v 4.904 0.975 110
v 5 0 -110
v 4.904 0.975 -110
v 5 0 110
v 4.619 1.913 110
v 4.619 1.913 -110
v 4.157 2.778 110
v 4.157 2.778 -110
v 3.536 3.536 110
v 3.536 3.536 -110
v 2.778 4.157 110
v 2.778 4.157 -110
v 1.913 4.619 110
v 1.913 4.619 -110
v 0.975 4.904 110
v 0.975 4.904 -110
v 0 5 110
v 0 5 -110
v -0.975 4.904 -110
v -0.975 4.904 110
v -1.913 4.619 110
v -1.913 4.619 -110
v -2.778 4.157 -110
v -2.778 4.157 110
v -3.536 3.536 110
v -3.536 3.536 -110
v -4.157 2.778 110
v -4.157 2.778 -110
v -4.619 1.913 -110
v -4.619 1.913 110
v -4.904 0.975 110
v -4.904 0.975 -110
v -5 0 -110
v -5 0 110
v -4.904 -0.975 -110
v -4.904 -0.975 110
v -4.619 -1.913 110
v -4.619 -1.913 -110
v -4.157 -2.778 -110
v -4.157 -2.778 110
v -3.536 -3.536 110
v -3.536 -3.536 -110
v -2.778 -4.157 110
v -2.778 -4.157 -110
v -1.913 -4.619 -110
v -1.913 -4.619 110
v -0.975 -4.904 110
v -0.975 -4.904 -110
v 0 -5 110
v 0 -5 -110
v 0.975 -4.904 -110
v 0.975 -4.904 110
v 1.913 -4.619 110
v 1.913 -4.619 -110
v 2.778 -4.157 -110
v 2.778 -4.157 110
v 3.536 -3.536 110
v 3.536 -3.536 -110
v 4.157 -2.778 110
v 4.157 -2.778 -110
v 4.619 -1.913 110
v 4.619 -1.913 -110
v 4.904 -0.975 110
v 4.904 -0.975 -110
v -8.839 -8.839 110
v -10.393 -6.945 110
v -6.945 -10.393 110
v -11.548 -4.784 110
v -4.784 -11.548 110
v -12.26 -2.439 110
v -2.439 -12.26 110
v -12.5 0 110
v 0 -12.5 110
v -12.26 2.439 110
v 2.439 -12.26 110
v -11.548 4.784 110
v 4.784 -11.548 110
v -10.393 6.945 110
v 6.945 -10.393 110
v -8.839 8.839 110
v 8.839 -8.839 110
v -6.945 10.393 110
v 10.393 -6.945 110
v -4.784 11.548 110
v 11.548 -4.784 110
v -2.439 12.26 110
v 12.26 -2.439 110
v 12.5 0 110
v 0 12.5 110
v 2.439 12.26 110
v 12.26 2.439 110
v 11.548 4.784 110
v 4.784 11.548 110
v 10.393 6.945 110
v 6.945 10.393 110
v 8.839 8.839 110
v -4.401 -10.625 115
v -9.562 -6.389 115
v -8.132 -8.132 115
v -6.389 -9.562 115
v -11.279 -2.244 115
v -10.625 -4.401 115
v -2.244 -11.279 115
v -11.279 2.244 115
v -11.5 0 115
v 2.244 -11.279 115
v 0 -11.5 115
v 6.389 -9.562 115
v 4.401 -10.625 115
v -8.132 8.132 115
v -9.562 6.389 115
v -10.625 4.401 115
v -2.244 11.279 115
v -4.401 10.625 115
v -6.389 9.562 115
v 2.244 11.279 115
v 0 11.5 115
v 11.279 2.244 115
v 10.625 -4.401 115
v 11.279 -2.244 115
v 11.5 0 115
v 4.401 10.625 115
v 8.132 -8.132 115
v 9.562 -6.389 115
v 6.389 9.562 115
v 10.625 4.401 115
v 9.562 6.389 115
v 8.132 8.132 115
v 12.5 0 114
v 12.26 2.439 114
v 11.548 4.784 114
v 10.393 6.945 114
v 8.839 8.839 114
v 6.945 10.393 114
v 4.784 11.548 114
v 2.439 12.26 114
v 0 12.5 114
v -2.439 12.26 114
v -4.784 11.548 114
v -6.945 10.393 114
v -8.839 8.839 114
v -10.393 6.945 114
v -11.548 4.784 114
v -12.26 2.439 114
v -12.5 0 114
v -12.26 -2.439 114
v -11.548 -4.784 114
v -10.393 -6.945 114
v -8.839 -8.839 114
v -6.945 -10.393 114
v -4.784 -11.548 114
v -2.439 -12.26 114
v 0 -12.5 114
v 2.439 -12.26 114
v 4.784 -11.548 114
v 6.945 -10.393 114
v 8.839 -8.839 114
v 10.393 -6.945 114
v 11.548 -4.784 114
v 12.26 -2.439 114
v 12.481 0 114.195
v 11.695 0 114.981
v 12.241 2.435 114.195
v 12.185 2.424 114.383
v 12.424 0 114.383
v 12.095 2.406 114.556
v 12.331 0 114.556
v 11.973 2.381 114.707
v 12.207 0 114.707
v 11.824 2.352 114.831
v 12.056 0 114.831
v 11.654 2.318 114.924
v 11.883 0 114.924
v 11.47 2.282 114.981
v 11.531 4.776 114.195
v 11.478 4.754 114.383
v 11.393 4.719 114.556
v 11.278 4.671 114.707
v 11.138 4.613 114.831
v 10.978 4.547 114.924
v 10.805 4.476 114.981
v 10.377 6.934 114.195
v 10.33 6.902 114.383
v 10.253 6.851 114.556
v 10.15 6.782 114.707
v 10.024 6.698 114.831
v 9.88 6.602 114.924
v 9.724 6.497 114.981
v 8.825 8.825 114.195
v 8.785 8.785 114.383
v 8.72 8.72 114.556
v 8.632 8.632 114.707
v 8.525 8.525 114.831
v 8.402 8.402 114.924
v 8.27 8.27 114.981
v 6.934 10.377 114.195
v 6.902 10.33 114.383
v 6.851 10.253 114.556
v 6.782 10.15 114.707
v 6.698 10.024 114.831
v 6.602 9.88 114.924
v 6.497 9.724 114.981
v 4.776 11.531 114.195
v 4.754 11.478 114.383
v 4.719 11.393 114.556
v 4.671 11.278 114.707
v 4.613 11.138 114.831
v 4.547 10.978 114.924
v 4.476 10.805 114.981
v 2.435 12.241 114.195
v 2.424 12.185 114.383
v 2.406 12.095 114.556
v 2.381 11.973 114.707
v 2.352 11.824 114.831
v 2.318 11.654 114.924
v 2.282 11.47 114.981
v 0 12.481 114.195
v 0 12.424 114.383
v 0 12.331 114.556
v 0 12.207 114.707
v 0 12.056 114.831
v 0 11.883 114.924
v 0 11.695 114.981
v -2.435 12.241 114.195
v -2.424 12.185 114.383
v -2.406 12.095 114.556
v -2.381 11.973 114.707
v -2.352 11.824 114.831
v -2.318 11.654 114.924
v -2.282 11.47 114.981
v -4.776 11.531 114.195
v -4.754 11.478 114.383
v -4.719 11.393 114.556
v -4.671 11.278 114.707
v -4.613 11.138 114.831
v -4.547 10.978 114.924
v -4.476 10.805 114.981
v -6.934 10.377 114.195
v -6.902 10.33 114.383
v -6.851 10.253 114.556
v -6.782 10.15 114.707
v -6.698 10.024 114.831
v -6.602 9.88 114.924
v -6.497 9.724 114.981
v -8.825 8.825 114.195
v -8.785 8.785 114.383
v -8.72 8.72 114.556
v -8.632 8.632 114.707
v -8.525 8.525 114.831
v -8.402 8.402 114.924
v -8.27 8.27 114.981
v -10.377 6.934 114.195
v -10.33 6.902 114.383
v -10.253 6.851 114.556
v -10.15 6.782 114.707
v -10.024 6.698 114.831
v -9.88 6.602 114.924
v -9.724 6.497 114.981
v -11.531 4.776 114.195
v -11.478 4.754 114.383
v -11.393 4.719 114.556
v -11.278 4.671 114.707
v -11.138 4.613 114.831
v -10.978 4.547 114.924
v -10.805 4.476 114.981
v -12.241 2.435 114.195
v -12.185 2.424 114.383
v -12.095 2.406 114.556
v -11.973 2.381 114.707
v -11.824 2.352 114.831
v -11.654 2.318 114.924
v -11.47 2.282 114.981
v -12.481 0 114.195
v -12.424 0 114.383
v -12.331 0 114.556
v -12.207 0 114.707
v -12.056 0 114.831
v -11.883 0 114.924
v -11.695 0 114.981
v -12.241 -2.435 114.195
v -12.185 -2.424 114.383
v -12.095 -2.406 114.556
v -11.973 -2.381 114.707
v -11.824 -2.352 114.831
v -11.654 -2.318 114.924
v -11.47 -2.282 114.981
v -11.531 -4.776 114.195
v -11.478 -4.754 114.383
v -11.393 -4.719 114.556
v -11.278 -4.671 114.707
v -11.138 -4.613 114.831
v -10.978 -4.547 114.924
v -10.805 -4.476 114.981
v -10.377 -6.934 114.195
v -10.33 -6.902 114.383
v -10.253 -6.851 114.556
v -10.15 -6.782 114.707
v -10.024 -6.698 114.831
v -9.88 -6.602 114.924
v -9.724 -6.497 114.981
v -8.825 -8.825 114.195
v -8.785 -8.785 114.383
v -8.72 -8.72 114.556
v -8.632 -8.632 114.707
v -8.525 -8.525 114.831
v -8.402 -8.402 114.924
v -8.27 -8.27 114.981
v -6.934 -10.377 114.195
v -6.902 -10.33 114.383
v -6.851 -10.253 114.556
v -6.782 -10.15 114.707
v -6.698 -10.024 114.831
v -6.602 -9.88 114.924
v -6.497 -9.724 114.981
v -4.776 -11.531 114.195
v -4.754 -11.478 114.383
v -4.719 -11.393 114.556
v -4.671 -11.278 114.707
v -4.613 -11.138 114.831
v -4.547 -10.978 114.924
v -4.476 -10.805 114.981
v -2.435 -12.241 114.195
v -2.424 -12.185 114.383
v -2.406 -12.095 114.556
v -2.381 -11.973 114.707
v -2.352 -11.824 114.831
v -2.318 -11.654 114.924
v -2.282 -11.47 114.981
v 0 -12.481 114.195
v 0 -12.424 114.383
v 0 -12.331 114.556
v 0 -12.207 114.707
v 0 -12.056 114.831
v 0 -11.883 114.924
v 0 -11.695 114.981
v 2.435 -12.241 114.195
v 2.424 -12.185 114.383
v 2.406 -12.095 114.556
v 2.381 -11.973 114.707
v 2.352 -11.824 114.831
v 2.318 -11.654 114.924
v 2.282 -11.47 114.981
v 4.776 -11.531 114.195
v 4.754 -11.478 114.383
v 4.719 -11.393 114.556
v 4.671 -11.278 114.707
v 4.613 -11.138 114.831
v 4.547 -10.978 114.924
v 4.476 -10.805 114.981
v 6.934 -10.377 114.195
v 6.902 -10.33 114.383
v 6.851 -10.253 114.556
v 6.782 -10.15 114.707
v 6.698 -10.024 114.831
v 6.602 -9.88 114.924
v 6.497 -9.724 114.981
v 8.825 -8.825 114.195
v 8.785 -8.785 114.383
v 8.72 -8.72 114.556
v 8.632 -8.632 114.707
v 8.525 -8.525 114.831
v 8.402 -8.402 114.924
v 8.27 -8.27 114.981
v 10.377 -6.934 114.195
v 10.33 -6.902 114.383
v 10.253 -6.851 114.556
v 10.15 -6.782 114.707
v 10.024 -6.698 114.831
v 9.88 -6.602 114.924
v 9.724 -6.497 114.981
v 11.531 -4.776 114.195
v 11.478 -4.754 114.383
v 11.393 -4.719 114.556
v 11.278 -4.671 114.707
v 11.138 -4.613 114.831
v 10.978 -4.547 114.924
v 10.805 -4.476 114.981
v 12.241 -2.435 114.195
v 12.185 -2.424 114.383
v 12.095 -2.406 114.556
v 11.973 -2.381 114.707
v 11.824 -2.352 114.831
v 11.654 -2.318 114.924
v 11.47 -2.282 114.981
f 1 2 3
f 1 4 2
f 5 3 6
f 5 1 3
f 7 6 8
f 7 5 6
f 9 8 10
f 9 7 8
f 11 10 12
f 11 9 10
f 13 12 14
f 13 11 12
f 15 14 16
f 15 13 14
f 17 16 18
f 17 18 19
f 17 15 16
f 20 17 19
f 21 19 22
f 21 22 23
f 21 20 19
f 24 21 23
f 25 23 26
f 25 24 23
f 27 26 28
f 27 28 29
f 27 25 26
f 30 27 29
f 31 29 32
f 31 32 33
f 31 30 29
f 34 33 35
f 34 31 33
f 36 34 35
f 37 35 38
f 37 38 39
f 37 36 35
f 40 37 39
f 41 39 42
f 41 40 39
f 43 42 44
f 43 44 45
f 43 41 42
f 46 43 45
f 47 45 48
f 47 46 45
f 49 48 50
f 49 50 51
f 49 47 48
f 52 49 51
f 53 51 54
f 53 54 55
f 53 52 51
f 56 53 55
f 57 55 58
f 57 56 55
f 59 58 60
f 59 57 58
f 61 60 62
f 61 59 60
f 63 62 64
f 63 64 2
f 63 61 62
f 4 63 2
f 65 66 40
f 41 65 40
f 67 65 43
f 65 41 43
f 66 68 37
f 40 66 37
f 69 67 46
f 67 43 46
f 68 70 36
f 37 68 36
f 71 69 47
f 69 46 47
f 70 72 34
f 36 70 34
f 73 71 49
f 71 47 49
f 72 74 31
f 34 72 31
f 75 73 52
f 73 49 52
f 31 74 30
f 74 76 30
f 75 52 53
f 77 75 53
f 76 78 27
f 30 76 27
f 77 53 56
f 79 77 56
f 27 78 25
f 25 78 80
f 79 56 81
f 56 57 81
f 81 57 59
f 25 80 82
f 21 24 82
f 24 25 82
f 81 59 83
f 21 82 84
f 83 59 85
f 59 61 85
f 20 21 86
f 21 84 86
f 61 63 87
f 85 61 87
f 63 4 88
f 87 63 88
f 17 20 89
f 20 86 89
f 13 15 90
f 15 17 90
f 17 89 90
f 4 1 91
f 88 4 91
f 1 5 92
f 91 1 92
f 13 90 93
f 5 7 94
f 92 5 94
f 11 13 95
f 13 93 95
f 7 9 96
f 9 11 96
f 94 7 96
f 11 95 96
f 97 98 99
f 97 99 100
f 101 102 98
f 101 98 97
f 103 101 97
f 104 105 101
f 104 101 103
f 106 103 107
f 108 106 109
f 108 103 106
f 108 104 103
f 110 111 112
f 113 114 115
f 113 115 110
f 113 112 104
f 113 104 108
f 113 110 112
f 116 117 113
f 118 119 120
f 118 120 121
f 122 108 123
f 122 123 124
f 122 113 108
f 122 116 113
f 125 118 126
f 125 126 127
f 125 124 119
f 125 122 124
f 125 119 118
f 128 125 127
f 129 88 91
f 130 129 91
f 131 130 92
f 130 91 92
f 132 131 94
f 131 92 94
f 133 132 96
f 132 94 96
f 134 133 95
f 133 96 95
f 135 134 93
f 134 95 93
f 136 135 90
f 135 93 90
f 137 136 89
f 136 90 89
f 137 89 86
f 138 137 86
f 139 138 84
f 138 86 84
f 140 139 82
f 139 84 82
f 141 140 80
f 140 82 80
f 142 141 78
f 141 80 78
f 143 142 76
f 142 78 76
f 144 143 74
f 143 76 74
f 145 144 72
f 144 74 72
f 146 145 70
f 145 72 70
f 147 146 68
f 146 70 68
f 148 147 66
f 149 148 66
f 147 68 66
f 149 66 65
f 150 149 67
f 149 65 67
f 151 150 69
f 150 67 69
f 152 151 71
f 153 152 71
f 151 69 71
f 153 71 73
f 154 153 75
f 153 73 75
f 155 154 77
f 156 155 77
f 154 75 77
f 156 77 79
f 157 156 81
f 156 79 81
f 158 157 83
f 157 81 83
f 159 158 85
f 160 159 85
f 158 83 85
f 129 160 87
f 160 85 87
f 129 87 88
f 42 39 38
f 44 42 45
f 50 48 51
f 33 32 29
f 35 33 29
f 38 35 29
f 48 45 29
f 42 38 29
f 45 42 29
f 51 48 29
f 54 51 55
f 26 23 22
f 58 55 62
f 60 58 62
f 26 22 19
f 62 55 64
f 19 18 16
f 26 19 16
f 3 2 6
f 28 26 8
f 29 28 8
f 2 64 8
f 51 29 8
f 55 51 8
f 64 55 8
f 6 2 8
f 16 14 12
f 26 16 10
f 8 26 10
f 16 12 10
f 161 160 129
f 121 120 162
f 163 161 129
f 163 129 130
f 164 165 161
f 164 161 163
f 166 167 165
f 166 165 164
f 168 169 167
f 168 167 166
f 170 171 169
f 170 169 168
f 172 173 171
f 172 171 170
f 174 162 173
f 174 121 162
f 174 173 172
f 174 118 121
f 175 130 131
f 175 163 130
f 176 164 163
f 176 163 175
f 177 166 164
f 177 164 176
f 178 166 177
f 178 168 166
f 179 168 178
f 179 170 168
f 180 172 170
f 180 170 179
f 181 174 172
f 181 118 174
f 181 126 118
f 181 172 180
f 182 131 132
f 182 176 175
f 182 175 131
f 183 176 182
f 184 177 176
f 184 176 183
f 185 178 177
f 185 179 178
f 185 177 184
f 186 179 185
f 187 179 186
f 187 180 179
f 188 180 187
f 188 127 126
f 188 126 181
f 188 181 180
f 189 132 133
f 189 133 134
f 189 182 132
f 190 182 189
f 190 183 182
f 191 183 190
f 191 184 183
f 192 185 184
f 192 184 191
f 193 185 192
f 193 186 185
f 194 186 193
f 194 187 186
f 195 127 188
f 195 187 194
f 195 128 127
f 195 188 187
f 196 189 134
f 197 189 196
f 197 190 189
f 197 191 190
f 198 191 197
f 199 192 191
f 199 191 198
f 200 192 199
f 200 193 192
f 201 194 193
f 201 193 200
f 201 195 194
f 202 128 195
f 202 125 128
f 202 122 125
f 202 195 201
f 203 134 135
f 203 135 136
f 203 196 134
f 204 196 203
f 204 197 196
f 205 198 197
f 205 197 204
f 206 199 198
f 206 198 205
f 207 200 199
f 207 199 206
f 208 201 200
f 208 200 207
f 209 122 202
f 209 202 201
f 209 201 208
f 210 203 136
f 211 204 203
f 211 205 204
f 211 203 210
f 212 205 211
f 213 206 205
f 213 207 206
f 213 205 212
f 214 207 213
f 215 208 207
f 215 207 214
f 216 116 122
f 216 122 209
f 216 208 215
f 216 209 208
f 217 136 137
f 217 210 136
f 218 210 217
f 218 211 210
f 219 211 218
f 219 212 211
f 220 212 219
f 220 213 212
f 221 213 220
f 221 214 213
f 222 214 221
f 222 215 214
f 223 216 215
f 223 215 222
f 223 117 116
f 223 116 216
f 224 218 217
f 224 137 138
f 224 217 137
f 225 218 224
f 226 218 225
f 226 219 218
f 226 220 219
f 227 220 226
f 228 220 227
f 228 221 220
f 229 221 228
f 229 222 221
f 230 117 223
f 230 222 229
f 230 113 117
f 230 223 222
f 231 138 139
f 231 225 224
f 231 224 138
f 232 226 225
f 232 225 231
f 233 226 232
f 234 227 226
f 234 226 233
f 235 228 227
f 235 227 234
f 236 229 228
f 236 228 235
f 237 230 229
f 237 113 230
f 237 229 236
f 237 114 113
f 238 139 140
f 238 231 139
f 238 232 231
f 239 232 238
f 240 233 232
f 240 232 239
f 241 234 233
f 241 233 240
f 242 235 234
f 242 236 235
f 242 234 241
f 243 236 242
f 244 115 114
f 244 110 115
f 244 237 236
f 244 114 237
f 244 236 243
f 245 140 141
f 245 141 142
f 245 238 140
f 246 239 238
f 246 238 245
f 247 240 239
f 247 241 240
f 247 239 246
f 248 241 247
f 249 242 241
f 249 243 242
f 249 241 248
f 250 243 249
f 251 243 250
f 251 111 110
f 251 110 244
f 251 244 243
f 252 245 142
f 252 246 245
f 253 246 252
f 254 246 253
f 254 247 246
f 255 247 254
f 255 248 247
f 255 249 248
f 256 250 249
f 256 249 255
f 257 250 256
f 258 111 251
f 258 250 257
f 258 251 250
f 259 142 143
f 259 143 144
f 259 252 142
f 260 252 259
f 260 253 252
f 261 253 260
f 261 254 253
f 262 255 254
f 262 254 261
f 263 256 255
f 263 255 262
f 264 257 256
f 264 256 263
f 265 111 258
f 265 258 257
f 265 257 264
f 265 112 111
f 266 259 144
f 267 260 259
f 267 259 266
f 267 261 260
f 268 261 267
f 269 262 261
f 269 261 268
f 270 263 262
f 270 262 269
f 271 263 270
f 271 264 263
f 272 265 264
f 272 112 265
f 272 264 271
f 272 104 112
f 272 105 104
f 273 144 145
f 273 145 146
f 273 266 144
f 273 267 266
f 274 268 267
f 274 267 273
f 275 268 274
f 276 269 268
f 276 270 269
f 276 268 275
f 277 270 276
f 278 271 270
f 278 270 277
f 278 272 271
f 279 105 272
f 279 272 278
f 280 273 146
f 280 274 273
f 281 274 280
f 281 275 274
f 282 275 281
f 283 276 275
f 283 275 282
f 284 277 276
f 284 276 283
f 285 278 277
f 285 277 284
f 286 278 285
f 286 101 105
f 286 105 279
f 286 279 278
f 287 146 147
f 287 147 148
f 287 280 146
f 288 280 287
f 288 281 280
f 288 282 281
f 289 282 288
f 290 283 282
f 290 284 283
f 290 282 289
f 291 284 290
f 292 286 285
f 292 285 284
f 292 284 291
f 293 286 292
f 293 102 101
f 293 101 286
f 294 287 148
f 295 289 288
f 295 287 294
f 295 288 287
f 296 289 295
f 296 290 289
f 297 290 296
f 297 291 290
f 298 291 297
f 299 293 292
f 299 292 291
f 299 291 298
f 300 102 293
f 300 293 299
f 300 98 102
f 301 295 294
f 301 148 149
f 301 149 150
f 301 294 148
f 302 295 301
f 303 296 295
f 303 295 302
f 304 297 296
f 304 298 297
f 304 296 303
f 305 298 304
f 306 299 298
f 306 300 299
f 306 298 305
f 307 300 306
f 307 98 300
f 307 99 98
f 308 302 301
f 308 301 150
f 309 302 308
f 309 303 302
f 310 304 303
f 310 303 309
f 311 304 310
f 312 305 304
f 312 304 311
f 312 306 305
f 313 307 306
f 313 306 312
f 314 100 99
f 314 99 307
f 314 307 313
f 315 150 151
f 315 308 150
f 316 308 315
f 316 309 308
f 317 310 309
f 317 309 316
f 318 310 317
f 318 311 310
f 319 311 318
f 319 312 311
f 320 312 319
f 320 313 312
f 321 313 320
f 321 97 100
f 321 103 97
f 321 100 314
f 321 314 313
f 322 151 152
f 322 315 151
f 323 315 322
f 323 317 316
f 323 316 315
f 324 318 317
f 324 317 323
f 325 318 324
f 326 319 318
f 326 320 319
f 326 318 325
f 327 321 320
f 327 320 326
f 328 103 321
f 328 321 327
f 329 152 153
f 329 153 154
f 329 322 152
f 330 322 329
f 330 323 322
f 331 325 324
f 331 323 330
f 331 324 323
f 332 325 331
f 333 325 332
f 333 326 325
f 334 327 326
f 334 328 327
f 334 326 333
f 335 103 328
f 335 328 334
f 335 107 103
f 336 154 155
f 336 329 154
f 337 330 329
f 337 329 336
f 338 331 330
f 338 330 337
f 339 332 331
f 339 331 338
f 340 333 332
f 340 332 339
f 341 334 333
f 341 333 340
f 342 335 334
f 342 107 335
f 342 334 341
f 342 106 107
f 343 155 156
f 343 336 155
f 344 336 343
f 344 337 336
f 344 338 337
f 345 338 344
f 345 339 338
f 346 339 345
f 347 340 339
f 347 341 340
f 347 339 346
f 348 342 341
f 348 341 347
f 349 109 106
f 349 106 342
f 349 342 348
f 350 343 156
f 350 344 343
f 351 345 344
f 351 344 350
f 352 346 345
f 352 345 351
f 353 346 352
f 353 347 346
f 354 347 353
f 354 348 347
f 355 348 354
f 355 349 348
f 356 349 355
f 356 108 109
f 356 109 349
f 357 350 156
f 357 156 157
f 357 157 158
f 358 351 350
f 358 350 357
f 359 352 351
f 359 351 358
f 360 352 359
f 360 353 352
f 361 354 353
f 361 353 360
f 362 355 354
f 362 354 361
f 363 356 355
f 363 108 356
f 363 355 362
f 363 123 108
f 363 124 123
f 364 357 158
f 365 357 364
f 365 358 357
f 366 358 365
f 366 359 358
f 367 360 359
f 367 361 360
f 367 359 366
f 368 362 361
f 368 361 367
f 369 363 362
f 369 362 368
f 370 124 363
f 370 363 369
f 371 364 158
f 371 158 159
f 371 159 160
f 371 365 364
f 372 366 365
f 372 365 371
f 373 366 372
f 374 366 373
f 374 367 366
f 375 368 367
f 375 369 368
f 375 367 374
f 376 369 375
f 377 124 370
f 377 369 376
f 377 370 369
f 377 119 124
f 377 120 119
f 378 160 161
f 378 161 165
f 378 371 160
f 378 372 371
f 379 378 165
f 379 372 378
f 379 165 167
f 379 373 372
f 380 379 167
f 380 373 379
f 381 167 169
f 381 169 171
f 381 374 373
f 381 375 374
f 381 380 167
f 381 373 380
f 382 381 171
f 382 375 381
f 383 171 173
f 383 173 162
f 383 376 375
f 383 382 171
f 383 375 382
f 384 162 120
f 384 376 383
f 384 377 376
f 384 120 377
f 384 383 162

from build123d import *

# Parameters (mm, degrees)
SKETCH1_R           = 5
BOSS_EXTRUDE1_DEPTH = 110
SKETCH2_R           = 12.5
BOSS_EXTRUDE2_DEPTH = 5
FILLET1_R           = 1


with BuildPart() as part:
    # Sketch1 → Boss-Extrude1 (new, symmetric)
    with BuildSketch(Plane.XY):
        Circle(SKETCH1_R)
    extrude(amount=BOSS_EXTRUDE1_DEPTH, both=True)

    # Sketch2 → Boss-Extrude2 (add)
    with BuildSketch(Plane.XY.offset(110)):
        Circle(SKETCH2_R)
    extrude(amount=BOSS_EXTRUDE2_DEPTH)

    # Fillet1
    fillet1_edges = [part.edges().sort_by_distance(p)[0] for p in [
        (-12.5, 0, 115),
    ]]
    fillet(fillet1_edges, radius=FILLET1_R)


solid = part.part
